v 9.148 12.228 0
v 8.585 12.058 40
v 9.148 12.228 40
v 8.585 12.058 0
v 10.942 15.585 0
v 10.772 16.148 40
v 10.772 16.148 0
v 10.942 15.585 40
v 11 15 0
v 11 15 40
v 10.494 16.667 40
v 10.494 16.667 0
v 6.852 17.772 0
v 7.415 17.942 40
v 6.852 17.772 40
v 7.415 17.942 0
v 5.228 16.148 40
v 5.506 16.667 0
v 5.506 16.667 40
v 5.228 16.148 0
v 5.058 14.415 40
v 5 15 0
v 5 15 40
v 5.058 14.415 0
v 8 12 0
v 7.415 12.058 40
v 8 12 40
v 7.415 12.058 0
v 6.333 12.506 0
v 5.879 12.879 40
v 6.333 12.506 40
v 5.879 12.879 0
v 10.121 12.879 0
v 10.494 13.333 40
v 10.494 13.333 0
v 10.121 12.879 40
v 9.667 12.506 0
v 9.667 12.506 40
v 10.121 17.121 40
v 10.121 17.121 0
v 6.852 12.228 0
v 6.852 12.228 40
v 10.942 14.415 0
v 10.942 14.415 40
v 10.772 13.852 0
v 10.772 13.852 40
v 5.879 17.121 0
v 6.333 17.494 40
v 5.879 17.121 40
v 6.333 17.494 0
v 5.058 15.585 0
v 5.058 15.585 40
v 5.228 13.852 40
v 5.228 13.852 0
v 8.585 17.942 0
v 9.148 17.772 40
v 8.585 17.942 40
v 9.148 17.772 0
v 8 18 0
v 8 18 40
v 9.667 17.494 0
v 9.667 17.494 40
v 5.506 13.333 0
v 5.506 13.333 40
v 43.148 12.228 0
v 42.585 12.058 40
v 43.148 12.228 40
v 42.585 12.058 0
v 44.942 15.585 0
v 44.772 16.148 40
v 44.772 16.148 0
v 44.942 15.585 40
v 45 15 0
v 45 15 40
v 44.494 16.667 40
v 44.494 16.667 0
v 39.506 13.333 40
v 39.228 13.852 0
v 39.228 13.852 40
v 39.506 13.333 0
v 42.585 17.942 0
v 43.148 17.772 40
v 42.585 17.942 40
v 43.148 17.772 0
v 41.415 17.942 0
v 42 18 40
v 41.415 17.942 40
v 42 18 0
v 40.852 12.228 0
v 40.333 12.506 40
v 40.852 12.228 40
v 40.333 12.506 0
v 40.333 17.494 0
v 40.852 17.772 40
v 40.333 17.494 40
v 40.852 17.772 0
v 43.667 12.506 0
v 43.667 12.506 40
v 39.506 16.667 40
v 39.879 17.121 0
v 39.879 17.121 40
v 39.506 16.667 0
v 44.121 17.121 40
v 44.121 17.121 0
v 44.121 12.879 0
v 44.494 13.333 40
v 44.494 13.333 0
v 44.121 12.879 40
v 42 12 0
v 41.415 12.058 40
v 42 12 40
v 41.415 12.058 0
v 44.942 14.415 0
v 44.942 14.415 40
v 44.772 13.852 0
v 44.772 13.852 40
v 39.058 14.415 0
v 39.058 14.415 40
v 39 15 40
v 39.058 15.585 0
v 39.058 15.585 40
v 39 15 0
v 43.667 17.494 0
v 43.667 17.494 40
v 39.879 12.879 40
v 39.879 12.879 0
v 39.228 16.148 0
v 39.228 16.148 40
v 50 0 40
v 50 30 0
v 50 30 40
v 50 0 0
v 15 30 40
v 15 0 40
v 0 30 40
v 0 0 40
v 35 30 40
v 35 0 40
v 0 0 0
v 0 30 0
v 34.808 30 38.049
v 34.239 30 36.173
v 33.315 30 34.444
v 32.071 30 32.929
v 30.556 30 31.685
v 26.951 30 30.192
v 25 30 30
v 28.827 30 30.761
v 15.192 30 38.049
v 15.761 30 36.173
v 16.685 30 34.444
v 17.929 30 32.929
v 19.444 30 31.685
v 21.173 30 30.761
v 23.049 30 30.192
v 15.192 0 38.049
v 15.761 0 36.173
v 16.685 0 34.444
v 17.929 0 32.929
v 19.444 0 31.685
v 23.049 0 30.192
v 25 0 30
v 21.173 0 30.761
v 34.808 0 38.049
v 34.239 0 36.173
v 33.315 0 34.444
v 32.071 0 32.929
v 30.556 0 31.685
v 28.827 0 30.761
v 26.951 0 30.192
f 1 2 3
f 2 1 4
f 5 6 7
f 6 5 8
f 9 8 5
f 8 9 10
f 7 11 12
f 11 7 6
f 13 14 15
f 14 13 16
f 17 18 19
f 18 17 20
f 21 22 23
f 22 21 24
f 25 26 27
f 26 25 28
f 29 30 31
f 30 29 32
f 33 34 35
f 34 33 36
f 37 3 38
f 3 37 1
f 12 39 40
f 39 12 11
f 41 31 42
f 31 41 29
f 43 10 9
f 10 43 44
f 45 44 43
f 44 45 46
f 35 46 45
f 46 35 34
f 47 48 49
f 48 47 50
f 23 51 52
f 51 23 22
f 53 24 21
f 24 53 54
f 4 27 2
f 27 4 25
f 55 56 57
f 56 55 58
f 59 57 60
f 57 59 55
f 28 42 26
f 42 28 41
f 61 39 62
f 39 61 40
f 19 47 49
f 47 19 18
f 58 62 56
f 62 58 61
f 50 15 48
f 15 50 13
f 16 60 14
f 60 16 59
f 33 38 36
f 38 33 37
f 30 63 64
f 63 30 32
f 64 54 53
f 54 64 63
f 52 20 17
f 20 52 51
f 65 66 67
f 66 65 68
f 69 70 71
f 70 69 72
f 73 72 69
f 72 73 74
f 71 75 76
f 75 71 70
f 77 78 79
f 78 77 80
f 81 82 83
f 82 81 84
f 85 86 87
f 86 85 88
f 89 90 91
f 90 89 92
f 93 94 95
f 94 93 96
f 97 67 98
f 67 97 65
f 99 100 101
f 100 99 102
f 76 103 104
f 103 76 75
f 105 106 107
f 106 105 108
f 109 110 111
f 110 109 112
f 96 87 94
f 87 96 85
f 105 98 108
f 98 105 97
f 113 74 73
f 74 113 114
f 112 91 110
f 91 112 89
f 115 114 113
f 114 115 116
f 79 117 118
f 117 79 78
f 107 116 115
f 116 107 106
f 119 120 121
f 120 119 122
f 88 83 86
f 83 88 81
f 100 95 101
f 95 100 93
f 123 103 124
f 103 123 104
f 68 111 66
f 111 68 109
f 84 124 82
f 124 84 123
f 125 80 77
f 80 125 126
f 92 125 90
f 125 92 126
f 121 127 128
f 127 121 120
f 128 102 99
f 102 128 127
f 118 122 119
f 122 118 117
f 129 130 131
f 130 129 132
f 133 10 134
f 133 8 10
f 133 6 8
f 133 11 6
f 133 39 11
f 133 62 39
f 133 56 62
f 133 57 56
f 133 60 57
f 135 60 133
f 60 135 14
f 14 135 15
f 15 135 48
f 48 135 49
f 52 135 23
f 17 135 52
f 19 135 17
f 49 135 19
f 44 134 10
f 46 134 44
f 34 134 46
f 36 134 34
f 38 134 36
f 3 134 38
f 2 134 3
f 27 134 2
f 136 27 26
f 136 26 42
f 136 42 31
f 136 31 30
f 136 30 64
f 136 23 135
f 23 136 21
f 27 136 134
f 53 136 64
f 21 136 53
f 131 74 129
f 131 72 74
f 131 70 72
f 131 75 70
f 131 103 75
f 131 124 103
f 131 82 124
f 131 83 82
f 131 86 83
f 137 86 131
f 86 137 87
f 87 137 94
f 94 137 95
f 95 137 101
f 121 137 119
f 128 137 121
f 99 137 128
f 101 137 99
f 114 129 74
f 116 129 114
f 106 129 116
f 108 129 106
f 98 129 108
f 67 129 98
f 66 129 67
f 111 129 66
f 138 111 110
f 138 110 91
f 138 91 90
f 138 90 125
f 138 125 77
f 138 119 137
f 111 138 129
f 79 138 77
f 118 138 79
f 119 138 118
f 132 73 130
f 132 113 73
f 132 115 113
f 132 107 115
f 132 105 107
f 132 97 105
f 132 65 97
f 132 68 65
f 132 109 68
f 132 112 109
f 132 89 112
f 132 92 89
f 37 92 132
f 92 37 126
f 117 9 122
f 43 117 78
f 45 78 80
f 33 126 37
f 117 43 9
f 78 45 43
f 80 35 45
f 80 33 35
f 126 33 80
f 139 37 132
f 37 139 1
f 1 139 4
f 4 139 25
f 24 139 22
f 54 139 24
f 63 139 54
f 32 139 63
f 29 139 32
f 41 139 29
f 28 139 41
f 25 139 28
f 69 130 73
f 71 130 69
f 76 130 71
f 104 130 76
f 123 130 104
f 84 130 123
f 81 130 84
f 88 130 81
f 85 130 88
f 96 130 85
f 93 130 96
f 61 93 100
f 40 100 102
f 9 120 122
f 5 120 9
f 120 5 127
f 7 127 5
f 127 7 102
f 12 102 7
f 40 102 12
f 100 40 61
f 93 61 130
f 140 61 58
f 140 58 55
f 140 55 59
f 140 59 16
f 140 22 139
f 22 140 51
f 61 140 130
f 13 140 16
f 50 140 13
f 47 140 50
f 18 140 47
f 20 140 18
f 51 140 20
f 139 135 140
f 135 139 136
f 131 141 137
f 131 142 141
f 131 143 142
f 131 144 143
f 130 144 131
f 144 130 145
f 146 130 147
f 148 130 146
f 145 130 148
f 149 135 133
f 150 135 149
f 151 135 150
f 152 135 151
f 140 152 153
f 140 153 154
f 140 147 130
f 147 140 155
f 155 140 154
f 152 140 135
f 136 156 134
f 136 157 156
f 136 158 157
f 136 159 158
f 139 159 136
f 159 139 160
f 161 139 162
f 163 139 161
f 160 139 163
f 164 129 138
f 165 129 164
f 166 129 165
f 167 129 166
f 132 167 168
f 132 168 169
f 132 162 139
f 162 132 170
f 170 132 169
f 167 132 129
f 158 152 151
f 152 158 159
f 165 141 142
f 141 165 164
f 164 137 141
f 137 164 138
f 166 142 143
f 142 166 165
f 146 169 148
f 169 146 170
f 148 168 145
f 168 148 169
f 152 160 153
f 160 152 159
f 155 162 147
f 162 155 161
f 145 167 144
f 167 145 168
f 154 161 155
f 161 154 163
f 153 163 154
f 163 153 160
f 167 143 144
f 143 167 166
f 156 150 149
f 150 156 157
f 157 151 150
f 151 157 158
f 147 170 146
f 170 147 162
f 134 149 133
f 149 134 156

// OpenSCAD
$fn = 32;

// ----------------------------------------------------------------------
// Saddle clamp: plain shaft clamp
// ----------------------------------------------------------------------

// --- parameters (mm) ---
blk_l = 50;               // block length, X
blk_w = 30;               // block width, Y
blk_h = 40;               // block height
clamp_r = 10;             // shaft groove radius
hole_r = 3;               // bolt hole radius
hole_m = 8;               // bolt hole margin from the ends

saw_depth = clamp_r + 3;  // saw kerf depth

difference() {
  cube([blk_l, blk_w, blk_h]);
  translate([blk_l / 2, -1, blk_h])
    rotate([-90, 0, 0])
      cylinder(h = blk_w + 2, r = clamp_r);
  for (sx = [0, 1])
    translate([sx ? blk_l - hole_m : hole_m, blk_w / 2, -1])
      cylinder(r = hole_r, h = blk_h + 2);
}
